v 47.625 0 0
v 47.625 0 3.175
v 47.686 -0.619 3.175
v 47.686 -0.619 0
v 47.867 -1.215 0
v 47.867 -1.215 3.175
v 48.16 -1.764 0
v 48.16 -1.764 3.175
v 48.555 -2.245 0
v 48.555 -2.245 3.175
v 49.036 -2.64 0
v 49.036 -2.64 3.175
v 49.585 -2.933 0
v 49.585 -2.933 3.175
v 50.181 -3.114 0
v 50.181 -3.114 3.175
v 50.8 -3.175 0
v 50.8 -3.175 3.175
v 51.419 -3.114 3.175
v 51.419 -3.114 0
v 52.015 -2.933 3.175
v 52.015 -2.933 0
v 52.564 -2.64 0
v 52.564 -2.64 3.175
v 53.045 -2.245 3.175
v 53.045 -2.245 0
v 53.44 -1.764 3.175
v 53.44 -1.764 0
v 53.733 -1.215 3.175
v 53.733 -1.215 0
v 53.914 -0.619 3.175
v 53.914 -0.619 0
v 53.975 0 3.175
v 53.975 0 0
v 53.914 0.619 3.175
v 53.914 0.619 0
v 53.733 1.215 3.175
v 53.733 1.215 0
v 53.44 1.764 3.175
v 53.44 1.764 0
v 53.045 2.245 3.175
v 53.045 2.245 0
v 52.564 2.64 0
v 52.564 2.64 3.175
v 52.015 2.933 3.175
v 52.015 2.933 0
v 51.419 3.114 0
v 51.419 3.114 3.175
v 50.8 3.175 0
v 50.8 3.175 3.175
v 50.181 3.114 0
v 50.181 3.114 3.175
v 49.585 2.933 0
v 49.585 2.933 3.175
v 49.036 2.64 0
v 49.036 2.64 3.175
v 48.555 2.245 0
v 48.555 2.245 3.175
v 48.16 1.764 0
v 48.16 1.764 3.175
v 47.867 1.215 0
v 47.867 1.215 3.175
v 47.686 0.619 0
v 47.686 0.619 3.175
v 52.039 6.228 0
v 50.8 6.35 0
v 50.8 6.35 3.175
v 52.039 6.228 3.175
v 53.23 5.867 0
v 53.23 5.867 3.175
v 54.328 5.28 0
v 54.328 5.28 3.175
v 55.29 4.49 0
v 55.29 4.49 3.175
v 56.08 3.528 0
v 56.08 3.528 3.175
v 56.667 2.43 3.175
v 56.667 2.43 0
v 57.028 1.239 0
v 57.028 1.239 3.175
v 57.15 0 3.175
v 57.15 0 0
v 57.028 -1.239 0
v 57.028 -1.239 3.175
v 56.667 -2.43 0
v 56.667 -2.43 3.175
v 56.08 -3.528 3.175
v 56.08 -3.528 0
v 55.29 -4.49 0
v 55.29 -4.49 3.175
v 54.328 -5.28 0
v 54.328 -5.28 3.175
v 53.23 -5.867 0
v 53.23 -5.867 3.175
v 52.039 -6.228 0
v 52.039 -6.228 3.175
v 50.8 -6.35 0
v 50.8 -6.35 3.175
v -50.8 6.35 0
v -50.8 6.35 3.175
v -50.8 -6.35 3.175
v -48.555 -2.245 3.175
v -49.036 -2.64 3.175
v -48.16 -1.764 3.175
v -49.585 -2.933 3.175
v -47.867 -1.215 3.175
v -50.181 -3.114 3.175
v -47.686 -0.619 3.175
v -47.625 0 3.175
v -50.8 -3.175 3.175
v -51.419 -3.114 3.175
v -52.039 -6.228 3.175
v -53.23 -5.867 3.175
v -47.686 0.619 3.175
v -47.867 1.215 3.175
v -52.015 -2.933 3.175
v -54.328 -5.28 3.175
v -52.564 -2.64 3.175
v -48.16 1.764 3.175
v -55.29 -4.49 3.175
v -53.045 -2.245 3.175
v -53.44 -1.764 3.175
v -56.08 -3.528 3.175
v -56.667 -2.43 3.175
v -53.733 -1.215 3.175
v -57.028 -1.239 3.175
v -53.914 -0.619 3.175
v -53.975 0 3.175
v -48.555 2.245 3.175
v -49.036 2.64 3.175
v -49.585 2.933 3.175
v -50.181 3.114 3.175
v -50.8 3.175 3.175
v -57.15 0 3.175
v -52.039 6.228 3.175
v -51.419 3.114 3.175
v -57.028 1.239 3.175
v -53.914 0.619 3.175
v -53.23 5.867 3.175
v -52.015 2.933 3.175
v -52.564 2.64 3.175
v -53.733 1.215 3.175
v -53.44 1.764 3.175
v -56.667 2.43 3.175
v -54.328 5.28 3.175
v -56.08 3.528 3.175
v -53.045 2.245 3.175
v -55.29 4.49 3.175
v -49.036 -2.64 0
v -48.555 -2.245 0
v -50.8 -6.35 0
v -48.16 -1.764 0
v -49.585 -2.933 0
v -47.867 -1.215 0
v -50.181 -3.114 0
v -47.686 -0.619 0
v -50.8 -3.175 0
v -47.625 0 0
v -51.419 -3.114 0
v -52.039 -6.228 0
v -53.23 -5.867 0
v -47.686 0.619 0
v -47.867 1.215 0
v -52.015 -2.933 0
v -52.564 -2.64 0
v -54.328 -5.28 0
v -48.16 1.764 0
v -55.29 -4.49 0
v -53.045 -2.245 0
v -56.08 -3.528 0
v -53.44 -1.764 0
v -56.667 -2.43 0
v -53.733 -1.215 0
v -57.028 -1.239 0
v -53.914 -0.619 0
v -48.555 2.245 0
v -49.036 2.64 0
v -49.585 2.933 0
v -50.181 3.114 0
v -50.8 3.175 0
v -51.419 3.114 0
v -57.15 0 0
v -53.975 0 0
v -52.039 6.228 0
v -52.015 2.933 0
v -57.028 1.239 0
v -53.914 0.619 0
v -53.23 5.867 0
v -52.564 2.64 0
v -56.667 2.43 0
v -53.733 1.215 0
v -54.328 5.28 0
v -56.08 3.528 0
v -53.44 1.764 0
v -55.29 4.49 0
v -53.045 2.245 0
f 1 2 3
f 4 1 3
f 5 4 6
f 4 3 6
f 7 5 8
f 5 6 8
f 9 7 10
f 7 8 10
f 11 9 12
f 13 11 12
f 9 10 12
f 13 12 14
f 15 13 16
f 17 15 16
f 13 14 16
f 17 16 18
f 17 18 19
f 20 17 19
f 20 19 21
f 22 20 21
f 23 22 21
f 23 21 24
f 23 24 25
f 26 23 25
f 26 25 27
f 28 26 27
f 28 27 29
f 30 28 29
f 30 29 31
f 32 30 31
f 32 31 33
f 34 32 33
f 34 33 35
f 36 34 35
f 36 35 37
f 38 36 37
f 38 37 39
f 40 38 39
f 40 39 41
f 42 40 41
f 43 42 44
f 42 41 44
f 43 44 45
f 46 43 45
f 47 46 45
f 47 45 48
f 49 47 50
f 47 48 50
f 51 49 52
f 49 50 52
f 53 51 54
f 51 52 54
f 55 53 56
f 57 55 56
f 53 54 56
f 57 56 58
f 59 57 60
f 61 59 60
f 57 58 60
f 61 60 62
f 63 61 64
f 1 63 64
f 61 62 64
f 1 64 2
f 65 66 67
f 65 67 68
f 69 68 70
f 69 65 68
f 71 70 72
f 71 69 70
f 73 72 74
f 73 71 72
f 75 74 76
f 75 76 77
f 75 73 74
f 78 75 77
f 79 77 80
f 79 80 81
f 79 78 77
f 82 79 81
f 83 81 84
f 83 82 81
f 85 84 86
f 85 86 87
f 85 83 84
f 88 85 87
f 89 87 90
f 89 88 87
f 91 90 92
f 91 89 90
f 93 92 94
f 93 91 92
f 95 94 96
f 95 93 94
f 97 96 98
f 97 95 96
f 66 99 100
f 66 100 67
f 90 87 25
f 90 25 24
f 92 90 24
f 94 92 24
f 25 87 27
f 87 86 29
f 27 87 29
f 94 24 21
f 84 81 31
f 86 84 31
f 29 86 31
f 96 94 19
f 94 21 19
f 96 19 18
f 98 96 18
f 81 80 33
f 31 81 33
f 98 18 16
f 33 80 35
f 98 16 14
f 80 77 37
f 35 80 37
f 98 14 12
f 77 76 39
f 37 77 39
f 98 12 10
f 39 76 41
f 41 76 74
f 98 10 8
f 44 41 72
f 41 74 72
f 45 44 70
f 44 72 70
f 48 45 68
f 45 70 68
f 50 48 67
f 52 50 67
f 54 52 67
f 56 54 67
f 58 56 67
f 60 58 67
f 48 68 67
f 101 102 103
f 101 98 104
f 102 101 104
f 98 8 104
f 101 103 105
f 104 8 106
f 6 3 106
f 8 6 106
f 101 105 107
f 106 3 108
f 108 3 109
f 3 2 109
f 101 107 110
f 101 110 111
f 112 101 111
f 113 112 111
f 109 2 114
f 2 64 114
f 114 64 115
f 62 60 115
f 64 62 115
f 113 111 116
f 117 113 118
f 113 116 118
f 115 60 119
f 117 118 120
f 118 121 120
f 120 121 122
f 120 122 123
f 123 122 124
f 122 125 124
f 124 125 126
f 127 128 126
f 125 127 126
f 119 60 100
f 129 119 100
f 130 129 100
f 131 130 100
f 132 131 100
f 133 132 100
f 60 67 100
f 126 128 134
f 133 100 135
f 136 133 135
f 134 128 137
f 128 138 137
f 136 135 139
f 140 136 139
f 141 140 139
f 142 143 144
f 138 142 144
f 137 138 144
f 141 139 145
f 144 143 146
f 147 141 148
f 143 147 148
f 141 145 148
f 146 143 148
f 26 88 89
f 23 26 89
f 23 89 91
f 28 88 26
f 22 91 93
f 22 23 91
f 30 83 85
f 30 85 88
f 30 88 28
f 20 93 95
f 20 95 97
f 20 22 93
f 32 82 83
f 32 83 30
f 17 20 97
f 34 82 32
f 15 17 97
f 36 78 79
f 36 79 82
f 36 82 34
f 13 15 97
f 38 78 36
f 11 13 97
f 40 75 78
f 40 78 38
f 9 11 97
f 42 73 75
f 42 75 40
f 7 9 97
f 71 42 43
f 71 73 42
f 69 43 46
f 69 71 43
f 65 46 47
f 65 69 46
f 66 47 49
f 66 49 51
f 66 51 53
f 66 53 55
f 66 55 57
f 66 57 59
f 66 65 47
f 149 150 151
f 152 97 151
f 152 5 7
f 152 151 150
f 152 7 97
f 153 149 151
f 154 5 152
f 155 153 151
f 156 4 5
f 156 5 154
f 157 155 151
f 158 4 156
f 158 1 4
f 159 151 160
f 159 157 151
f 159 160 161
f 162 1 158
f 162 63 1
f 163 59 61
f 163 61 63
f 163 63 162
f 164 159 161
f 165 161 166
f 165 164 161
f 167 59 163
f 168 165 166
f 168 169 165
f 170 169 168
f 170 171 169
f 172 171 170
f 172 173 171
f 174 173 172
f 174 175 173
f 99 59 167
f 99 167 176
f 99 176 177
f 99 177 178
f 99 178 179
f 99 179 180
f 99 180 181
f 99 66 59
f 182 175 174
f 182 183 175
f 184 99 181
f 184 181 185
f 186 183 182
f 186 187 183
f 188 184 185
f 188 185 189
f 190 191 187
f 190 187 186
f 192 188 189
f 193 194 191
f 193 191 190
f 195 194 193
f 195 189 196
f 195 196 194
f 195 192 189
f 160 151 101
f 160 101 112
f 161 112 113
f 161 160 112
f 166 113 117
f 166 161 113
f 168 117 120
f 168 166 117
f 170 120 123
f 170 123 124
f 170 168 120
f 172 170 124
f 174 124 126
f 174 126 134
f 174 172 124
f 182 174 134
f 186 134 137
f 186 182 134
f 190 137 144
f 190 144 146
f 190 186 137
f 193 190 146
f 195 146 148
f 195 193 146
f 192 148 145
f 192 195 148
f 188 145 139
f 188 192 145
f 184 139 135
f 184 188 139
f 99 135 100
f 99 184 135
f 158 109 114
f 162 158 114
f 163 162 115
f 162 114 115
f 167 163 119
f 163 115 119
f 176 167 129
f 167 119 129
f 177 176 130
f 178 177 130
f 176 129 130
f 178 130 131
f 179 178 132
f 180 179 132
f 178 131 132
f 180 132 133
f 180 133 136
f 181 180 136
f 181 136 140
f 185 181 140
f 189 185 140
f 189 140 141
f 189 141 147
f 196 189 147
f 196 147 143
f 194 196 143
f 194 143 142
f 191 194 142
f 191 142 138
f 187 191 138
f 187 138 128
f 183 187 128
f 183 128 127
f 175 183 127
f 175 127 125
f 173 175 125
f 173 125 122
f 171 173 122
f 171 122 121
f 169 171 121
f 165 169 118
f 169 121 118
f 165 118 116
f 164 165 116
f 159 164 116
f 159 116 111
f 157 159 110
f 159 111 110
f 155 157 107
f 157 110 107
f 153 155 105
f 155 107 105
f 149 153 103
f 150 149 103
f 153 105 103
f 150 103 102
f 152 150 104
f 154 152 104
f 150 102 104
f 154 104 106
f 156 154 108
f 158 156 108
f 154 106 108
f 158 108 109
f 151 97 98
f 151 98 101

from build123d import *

# Parameters (mm, degrees)
BOSS_EXTRUDE1_DEPTH = 3.175
SKETCH3_R           = 3.175
CUT_EXTRUDE1_DEPTH  = 58.589283942


with BuildPart() as part:
    # Sketch2 → Boss-Extrude1 (new body)
    with BuildSketch(Plane.XY):
        with BuildLine():
            Line((-50.8, 6.35), (50.8, 6.35))
            ThreePointArc((50.8, 6.35), (57.15, 0), (50.8, -6.35))
            Line((50.8, -6.35), (-50.8, -6.35))
            ThreePointArc((-50.8, -6.35), (-57.15, 0), (-50.8, 6.35))
        make_face()
    extrude(amount=BOSS_EXTRUDE1_DEPTH)

    # Sketch3 → Cut-Extrude1 (cut, through all)
    with BuildSketch(Plane.XY.offset(3.175)):
        with Locations((-50.8, 0)):
            Circle(SKETCH3_R)
        with Locations(Location((50.8, 0, 0), (0, 0, 180))):
            Circle(SKETCH3_R)
    extrude(amount=-CUT_EXTRUDE1_DEPTH, mode=Mode.SUBTRACT)


solid = part.part
